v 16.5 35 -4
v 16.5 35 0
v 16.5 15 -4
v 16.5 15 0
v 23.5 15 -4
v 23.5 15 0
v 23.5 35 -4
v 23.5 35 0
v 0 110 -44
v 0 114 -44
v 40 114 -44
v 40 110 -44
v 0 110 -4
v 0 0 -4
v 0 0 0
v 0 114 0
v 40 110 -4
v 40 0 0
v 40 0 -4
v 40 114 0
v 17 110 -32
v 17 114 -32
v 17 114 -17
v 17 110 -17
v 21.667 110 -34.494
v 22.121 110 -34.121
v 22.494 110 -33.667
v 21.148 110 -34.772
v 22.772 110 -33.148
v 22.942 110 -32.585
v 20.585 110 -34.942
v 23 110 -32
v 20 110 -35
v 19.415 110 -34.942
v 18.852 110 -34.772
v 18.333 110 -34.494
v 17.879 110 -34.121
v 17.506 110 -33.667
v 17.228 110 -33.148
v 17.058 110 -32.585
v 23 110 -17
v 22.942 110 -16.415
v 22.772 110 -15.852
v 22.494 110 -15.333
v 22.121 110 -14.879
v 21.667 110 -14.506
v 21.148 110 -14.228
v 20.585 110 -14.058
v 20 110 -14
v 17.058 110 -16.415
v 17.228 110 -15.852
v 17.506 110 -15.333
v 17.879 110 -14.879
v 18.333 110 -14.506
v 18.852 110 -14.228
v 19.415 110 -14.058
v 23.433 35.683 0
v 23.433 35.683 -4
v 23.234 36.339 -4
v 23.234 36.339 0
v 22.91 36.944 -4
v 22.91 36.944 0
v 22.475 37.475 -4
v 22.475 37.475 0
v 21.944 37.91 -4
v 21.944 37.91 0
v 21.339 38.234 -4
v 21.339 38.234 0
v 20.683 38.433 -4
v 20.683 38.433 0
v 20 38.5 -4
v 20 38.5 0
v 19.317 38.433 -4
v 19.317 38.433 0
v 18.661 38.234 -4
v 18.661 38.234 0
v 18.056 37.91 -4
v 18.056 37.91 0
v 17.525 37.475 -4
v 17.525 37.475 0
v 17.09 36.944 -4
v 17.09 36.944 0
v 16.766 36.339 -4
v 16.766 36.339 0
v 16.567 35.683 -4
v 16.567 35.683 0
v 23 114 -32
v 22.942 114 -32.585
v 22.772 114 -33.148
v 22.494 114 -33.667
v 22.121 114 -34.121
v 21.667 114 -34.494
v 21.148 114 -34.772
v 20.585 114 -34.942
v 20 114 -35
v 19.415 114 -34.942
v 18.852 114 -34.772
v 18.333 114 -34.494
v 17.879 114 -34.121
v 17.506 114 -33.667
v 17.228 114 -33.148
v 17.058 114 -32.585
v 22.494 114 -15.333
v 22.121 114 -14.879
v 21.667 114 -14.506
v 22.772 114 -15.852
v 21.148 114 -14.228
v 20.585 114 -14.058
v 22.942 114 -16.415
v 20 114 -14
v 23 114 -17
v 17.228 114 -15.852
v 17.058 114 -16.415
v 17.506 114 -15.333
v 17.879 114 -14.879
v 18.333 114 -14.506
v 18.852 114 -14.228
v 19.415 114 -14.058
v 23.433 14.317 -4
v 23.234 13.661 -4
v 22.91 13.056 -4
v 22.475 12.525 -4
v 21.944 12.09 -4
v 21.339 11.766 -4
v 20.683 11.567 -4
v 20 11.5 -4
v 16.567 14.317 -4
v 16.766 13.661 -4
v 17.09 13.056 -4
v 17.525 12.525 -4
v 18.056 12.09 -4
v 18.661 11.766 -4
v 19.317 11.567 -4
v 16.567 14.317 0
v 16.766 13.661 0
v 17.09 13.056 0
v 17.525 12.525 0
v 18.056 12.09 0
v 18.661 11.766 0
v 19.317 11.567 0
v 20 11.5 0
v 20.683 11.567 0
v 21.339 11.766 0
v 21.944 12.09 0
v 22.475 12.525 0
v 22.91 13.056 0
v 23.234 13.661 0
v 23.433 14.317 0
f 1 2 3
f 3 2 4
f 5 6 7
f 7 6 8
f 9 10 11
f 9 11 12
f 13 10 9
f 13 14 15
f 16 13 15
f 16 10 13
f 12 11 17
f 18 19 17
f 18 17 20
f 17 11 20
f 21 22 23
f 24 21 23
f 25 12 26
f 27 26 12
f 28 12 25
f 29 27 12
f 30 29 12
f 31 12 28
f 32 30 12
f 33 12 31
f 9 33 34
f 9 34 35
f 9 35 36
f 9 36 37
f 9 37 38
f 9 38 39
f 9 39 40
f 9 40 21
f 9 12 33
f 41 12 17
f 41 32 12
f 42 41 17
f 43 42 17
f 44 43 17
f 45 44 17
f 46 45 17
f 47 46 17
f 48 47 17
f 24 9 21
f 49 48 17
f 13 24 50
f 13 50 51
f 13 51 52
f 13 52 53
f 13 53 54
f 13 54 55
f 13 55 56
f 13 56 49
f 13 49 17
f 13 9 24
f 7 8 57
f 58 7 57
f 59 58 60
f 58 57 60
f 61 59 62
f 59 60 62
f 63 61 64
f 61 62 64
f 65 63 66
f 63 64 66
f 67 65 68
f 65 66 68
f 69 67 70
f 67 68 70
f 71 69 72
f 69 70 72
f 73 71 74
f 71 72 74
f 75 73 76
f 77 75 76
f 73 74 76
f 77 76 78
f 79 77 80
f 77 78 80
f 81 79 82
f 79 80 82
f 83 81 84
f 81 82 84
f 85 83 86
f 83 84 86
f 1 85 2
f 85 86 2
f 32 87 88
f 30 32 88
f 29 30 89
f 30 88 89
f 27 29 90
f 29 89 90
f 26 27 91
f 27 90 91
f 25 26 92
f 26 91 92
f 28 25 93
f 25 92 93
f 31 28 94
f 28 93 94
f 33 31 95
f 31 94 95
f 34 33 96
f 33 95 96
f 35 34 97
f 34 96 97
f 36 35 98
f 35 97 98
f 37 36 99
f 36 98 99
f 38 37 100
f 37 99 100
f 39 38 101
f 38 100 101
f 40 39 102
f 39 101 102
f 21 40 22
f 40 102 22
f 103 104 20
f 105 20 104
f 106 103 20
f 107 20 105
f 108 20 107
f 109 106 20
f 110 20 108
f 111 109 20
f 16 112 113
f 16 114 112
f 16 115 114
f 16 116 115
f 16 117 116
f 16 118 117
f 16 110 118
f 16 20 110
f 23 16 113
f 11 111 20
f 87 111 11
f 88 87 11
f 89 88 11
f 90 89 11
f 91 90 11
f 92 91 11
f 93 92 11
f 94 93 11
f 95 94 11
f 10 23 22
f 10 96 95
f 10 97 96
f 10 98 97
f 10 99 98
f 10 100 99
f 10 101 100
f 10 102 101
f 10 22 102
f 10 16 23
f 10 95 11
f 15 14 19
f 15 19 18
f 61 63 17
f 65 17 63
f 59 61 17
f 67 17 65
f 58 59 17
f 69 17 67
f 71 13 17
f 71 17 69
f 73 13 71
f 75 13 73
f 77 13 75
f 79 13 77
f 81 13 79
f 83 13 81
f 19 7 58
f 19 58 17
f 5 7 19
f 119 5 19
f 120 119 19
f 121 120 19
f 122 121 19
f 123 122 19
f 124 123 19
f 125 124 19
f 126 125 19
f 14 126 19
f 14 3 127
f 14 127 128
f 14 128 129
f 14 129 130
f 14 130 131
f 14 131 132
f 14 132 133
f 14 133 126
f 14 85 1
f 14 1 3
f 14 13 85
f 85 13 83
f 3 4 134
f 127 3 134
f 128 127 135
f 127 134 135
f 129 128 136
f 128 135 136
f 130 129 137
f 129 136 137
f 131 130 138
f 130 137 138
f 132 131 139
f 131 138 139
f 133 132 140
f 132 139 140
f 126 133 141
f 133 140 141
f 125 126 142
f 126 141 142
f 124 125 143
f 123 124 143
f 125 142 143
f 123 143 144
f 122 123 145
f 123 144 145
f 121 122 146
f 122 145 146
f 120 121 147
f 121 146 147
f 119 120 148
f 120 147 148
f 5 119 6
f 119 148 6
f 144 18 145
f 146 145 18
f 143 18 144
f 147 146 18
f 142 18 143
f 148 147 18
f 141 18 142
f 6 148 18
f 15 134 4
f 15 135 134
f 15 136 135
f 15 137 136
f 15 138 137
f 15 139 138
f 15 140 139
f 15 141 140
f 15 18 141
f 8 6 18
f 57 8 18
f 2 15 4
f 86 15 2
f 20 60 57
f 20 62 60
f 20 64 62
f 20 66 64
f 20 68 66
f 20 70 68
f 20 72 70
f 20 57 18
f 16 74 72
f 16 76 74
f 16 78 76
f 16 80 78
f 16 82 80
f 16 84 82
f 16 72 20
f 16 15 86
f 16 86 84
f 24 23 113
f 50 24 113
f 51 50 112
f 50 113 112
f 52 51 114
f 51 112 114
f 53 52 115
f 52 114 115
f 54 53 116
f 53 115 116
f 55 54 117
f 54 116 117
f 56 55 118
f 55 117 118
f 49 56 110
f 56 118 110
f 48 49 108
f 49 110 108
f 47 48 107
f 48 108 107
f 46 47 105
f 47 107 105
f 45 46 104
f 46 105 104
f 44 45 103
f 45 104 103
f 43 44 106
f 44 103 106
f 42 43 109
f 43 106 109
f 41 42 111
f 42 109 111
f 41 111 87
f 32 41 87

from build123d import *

# Parameters (mm, degrees)
EXTRUDE_1_DEPTH     = 40
CUT_EXTRUDE_1_REACH = 130.577
CUT_EXTRUDE_2_REACH = 130.577


with BuildPart() as part:
    # 草图1 → 凸台-拉伸1 (new body)
    with BuildSketch(Plane(origin=(0, 0, 0), x_dir=(0, 0, -1), z_dir=(1, 0, 0))):
        Polygon((0, 0), (0, 114), (44, 114), (44, 110), (4, 110), (4, 0), align=None)
    extrude(amount=EXTRUDE_1_DEPTH)

    # 草图2 → 切除-拉伸1 (cut, up to next)
    with BuildSketch(Plane(origin=(0, 114, 0), x_dir=(1, 0, 0), z_dir=(0, 1, 0)), mode=Mode.PRIVATE) as cut_extrude_1_sk1:
        with BuildLine():
            Line((17, 32), (17, 17))
            ThreePointArc((17, 17), (20, 14), (23, 17))
            Line((23, 17), (23, 32))
            ThreePointArc((23, 32), (20, 35), (17, 32))
        make_face()
    cut_extrude_1_tool1 = extrude(cut_extrude_1_sk1.sketch, amount=-CUT_EXTRUDE_1_REACH, mode=Mode.PRIVATE) & part.part
    add(cut_extrude_1_tool1.solids().sort_by_distance((20, 114, -24.5))[0], mode=Mode.SUBTRACT)

    # 草图3 → 切除-拉伸2 (cut, up to next)
    with BuildSketch(Plane.XY, mode=Mode.PRIVATE) as cut_extrude_2_sk1:
        with BuildLine():
            Line((23.5, 15), (23.5, 35))
            ThreePointArc((23.5, 35), (20, 38.5), (16.5, 35))
            Line((16.5, 35), (16.5, 15))
            ThreePointArc((16.5, 15), (20, 11.5), (23.5, 15))
        make_face()
    cut_extrude_2_tool1 = extrude(cut_extrude_2_sk1.sketch, amount=-CUT_EXTRUDE_2_REACH, mode=Mode.PRIVATE) & part.part
    add(cut_extrude_2_tool1.solids().sort_by_distance((20, 25, 0))[0], mode=Mode.SUBTRACT)


solid = part.part
